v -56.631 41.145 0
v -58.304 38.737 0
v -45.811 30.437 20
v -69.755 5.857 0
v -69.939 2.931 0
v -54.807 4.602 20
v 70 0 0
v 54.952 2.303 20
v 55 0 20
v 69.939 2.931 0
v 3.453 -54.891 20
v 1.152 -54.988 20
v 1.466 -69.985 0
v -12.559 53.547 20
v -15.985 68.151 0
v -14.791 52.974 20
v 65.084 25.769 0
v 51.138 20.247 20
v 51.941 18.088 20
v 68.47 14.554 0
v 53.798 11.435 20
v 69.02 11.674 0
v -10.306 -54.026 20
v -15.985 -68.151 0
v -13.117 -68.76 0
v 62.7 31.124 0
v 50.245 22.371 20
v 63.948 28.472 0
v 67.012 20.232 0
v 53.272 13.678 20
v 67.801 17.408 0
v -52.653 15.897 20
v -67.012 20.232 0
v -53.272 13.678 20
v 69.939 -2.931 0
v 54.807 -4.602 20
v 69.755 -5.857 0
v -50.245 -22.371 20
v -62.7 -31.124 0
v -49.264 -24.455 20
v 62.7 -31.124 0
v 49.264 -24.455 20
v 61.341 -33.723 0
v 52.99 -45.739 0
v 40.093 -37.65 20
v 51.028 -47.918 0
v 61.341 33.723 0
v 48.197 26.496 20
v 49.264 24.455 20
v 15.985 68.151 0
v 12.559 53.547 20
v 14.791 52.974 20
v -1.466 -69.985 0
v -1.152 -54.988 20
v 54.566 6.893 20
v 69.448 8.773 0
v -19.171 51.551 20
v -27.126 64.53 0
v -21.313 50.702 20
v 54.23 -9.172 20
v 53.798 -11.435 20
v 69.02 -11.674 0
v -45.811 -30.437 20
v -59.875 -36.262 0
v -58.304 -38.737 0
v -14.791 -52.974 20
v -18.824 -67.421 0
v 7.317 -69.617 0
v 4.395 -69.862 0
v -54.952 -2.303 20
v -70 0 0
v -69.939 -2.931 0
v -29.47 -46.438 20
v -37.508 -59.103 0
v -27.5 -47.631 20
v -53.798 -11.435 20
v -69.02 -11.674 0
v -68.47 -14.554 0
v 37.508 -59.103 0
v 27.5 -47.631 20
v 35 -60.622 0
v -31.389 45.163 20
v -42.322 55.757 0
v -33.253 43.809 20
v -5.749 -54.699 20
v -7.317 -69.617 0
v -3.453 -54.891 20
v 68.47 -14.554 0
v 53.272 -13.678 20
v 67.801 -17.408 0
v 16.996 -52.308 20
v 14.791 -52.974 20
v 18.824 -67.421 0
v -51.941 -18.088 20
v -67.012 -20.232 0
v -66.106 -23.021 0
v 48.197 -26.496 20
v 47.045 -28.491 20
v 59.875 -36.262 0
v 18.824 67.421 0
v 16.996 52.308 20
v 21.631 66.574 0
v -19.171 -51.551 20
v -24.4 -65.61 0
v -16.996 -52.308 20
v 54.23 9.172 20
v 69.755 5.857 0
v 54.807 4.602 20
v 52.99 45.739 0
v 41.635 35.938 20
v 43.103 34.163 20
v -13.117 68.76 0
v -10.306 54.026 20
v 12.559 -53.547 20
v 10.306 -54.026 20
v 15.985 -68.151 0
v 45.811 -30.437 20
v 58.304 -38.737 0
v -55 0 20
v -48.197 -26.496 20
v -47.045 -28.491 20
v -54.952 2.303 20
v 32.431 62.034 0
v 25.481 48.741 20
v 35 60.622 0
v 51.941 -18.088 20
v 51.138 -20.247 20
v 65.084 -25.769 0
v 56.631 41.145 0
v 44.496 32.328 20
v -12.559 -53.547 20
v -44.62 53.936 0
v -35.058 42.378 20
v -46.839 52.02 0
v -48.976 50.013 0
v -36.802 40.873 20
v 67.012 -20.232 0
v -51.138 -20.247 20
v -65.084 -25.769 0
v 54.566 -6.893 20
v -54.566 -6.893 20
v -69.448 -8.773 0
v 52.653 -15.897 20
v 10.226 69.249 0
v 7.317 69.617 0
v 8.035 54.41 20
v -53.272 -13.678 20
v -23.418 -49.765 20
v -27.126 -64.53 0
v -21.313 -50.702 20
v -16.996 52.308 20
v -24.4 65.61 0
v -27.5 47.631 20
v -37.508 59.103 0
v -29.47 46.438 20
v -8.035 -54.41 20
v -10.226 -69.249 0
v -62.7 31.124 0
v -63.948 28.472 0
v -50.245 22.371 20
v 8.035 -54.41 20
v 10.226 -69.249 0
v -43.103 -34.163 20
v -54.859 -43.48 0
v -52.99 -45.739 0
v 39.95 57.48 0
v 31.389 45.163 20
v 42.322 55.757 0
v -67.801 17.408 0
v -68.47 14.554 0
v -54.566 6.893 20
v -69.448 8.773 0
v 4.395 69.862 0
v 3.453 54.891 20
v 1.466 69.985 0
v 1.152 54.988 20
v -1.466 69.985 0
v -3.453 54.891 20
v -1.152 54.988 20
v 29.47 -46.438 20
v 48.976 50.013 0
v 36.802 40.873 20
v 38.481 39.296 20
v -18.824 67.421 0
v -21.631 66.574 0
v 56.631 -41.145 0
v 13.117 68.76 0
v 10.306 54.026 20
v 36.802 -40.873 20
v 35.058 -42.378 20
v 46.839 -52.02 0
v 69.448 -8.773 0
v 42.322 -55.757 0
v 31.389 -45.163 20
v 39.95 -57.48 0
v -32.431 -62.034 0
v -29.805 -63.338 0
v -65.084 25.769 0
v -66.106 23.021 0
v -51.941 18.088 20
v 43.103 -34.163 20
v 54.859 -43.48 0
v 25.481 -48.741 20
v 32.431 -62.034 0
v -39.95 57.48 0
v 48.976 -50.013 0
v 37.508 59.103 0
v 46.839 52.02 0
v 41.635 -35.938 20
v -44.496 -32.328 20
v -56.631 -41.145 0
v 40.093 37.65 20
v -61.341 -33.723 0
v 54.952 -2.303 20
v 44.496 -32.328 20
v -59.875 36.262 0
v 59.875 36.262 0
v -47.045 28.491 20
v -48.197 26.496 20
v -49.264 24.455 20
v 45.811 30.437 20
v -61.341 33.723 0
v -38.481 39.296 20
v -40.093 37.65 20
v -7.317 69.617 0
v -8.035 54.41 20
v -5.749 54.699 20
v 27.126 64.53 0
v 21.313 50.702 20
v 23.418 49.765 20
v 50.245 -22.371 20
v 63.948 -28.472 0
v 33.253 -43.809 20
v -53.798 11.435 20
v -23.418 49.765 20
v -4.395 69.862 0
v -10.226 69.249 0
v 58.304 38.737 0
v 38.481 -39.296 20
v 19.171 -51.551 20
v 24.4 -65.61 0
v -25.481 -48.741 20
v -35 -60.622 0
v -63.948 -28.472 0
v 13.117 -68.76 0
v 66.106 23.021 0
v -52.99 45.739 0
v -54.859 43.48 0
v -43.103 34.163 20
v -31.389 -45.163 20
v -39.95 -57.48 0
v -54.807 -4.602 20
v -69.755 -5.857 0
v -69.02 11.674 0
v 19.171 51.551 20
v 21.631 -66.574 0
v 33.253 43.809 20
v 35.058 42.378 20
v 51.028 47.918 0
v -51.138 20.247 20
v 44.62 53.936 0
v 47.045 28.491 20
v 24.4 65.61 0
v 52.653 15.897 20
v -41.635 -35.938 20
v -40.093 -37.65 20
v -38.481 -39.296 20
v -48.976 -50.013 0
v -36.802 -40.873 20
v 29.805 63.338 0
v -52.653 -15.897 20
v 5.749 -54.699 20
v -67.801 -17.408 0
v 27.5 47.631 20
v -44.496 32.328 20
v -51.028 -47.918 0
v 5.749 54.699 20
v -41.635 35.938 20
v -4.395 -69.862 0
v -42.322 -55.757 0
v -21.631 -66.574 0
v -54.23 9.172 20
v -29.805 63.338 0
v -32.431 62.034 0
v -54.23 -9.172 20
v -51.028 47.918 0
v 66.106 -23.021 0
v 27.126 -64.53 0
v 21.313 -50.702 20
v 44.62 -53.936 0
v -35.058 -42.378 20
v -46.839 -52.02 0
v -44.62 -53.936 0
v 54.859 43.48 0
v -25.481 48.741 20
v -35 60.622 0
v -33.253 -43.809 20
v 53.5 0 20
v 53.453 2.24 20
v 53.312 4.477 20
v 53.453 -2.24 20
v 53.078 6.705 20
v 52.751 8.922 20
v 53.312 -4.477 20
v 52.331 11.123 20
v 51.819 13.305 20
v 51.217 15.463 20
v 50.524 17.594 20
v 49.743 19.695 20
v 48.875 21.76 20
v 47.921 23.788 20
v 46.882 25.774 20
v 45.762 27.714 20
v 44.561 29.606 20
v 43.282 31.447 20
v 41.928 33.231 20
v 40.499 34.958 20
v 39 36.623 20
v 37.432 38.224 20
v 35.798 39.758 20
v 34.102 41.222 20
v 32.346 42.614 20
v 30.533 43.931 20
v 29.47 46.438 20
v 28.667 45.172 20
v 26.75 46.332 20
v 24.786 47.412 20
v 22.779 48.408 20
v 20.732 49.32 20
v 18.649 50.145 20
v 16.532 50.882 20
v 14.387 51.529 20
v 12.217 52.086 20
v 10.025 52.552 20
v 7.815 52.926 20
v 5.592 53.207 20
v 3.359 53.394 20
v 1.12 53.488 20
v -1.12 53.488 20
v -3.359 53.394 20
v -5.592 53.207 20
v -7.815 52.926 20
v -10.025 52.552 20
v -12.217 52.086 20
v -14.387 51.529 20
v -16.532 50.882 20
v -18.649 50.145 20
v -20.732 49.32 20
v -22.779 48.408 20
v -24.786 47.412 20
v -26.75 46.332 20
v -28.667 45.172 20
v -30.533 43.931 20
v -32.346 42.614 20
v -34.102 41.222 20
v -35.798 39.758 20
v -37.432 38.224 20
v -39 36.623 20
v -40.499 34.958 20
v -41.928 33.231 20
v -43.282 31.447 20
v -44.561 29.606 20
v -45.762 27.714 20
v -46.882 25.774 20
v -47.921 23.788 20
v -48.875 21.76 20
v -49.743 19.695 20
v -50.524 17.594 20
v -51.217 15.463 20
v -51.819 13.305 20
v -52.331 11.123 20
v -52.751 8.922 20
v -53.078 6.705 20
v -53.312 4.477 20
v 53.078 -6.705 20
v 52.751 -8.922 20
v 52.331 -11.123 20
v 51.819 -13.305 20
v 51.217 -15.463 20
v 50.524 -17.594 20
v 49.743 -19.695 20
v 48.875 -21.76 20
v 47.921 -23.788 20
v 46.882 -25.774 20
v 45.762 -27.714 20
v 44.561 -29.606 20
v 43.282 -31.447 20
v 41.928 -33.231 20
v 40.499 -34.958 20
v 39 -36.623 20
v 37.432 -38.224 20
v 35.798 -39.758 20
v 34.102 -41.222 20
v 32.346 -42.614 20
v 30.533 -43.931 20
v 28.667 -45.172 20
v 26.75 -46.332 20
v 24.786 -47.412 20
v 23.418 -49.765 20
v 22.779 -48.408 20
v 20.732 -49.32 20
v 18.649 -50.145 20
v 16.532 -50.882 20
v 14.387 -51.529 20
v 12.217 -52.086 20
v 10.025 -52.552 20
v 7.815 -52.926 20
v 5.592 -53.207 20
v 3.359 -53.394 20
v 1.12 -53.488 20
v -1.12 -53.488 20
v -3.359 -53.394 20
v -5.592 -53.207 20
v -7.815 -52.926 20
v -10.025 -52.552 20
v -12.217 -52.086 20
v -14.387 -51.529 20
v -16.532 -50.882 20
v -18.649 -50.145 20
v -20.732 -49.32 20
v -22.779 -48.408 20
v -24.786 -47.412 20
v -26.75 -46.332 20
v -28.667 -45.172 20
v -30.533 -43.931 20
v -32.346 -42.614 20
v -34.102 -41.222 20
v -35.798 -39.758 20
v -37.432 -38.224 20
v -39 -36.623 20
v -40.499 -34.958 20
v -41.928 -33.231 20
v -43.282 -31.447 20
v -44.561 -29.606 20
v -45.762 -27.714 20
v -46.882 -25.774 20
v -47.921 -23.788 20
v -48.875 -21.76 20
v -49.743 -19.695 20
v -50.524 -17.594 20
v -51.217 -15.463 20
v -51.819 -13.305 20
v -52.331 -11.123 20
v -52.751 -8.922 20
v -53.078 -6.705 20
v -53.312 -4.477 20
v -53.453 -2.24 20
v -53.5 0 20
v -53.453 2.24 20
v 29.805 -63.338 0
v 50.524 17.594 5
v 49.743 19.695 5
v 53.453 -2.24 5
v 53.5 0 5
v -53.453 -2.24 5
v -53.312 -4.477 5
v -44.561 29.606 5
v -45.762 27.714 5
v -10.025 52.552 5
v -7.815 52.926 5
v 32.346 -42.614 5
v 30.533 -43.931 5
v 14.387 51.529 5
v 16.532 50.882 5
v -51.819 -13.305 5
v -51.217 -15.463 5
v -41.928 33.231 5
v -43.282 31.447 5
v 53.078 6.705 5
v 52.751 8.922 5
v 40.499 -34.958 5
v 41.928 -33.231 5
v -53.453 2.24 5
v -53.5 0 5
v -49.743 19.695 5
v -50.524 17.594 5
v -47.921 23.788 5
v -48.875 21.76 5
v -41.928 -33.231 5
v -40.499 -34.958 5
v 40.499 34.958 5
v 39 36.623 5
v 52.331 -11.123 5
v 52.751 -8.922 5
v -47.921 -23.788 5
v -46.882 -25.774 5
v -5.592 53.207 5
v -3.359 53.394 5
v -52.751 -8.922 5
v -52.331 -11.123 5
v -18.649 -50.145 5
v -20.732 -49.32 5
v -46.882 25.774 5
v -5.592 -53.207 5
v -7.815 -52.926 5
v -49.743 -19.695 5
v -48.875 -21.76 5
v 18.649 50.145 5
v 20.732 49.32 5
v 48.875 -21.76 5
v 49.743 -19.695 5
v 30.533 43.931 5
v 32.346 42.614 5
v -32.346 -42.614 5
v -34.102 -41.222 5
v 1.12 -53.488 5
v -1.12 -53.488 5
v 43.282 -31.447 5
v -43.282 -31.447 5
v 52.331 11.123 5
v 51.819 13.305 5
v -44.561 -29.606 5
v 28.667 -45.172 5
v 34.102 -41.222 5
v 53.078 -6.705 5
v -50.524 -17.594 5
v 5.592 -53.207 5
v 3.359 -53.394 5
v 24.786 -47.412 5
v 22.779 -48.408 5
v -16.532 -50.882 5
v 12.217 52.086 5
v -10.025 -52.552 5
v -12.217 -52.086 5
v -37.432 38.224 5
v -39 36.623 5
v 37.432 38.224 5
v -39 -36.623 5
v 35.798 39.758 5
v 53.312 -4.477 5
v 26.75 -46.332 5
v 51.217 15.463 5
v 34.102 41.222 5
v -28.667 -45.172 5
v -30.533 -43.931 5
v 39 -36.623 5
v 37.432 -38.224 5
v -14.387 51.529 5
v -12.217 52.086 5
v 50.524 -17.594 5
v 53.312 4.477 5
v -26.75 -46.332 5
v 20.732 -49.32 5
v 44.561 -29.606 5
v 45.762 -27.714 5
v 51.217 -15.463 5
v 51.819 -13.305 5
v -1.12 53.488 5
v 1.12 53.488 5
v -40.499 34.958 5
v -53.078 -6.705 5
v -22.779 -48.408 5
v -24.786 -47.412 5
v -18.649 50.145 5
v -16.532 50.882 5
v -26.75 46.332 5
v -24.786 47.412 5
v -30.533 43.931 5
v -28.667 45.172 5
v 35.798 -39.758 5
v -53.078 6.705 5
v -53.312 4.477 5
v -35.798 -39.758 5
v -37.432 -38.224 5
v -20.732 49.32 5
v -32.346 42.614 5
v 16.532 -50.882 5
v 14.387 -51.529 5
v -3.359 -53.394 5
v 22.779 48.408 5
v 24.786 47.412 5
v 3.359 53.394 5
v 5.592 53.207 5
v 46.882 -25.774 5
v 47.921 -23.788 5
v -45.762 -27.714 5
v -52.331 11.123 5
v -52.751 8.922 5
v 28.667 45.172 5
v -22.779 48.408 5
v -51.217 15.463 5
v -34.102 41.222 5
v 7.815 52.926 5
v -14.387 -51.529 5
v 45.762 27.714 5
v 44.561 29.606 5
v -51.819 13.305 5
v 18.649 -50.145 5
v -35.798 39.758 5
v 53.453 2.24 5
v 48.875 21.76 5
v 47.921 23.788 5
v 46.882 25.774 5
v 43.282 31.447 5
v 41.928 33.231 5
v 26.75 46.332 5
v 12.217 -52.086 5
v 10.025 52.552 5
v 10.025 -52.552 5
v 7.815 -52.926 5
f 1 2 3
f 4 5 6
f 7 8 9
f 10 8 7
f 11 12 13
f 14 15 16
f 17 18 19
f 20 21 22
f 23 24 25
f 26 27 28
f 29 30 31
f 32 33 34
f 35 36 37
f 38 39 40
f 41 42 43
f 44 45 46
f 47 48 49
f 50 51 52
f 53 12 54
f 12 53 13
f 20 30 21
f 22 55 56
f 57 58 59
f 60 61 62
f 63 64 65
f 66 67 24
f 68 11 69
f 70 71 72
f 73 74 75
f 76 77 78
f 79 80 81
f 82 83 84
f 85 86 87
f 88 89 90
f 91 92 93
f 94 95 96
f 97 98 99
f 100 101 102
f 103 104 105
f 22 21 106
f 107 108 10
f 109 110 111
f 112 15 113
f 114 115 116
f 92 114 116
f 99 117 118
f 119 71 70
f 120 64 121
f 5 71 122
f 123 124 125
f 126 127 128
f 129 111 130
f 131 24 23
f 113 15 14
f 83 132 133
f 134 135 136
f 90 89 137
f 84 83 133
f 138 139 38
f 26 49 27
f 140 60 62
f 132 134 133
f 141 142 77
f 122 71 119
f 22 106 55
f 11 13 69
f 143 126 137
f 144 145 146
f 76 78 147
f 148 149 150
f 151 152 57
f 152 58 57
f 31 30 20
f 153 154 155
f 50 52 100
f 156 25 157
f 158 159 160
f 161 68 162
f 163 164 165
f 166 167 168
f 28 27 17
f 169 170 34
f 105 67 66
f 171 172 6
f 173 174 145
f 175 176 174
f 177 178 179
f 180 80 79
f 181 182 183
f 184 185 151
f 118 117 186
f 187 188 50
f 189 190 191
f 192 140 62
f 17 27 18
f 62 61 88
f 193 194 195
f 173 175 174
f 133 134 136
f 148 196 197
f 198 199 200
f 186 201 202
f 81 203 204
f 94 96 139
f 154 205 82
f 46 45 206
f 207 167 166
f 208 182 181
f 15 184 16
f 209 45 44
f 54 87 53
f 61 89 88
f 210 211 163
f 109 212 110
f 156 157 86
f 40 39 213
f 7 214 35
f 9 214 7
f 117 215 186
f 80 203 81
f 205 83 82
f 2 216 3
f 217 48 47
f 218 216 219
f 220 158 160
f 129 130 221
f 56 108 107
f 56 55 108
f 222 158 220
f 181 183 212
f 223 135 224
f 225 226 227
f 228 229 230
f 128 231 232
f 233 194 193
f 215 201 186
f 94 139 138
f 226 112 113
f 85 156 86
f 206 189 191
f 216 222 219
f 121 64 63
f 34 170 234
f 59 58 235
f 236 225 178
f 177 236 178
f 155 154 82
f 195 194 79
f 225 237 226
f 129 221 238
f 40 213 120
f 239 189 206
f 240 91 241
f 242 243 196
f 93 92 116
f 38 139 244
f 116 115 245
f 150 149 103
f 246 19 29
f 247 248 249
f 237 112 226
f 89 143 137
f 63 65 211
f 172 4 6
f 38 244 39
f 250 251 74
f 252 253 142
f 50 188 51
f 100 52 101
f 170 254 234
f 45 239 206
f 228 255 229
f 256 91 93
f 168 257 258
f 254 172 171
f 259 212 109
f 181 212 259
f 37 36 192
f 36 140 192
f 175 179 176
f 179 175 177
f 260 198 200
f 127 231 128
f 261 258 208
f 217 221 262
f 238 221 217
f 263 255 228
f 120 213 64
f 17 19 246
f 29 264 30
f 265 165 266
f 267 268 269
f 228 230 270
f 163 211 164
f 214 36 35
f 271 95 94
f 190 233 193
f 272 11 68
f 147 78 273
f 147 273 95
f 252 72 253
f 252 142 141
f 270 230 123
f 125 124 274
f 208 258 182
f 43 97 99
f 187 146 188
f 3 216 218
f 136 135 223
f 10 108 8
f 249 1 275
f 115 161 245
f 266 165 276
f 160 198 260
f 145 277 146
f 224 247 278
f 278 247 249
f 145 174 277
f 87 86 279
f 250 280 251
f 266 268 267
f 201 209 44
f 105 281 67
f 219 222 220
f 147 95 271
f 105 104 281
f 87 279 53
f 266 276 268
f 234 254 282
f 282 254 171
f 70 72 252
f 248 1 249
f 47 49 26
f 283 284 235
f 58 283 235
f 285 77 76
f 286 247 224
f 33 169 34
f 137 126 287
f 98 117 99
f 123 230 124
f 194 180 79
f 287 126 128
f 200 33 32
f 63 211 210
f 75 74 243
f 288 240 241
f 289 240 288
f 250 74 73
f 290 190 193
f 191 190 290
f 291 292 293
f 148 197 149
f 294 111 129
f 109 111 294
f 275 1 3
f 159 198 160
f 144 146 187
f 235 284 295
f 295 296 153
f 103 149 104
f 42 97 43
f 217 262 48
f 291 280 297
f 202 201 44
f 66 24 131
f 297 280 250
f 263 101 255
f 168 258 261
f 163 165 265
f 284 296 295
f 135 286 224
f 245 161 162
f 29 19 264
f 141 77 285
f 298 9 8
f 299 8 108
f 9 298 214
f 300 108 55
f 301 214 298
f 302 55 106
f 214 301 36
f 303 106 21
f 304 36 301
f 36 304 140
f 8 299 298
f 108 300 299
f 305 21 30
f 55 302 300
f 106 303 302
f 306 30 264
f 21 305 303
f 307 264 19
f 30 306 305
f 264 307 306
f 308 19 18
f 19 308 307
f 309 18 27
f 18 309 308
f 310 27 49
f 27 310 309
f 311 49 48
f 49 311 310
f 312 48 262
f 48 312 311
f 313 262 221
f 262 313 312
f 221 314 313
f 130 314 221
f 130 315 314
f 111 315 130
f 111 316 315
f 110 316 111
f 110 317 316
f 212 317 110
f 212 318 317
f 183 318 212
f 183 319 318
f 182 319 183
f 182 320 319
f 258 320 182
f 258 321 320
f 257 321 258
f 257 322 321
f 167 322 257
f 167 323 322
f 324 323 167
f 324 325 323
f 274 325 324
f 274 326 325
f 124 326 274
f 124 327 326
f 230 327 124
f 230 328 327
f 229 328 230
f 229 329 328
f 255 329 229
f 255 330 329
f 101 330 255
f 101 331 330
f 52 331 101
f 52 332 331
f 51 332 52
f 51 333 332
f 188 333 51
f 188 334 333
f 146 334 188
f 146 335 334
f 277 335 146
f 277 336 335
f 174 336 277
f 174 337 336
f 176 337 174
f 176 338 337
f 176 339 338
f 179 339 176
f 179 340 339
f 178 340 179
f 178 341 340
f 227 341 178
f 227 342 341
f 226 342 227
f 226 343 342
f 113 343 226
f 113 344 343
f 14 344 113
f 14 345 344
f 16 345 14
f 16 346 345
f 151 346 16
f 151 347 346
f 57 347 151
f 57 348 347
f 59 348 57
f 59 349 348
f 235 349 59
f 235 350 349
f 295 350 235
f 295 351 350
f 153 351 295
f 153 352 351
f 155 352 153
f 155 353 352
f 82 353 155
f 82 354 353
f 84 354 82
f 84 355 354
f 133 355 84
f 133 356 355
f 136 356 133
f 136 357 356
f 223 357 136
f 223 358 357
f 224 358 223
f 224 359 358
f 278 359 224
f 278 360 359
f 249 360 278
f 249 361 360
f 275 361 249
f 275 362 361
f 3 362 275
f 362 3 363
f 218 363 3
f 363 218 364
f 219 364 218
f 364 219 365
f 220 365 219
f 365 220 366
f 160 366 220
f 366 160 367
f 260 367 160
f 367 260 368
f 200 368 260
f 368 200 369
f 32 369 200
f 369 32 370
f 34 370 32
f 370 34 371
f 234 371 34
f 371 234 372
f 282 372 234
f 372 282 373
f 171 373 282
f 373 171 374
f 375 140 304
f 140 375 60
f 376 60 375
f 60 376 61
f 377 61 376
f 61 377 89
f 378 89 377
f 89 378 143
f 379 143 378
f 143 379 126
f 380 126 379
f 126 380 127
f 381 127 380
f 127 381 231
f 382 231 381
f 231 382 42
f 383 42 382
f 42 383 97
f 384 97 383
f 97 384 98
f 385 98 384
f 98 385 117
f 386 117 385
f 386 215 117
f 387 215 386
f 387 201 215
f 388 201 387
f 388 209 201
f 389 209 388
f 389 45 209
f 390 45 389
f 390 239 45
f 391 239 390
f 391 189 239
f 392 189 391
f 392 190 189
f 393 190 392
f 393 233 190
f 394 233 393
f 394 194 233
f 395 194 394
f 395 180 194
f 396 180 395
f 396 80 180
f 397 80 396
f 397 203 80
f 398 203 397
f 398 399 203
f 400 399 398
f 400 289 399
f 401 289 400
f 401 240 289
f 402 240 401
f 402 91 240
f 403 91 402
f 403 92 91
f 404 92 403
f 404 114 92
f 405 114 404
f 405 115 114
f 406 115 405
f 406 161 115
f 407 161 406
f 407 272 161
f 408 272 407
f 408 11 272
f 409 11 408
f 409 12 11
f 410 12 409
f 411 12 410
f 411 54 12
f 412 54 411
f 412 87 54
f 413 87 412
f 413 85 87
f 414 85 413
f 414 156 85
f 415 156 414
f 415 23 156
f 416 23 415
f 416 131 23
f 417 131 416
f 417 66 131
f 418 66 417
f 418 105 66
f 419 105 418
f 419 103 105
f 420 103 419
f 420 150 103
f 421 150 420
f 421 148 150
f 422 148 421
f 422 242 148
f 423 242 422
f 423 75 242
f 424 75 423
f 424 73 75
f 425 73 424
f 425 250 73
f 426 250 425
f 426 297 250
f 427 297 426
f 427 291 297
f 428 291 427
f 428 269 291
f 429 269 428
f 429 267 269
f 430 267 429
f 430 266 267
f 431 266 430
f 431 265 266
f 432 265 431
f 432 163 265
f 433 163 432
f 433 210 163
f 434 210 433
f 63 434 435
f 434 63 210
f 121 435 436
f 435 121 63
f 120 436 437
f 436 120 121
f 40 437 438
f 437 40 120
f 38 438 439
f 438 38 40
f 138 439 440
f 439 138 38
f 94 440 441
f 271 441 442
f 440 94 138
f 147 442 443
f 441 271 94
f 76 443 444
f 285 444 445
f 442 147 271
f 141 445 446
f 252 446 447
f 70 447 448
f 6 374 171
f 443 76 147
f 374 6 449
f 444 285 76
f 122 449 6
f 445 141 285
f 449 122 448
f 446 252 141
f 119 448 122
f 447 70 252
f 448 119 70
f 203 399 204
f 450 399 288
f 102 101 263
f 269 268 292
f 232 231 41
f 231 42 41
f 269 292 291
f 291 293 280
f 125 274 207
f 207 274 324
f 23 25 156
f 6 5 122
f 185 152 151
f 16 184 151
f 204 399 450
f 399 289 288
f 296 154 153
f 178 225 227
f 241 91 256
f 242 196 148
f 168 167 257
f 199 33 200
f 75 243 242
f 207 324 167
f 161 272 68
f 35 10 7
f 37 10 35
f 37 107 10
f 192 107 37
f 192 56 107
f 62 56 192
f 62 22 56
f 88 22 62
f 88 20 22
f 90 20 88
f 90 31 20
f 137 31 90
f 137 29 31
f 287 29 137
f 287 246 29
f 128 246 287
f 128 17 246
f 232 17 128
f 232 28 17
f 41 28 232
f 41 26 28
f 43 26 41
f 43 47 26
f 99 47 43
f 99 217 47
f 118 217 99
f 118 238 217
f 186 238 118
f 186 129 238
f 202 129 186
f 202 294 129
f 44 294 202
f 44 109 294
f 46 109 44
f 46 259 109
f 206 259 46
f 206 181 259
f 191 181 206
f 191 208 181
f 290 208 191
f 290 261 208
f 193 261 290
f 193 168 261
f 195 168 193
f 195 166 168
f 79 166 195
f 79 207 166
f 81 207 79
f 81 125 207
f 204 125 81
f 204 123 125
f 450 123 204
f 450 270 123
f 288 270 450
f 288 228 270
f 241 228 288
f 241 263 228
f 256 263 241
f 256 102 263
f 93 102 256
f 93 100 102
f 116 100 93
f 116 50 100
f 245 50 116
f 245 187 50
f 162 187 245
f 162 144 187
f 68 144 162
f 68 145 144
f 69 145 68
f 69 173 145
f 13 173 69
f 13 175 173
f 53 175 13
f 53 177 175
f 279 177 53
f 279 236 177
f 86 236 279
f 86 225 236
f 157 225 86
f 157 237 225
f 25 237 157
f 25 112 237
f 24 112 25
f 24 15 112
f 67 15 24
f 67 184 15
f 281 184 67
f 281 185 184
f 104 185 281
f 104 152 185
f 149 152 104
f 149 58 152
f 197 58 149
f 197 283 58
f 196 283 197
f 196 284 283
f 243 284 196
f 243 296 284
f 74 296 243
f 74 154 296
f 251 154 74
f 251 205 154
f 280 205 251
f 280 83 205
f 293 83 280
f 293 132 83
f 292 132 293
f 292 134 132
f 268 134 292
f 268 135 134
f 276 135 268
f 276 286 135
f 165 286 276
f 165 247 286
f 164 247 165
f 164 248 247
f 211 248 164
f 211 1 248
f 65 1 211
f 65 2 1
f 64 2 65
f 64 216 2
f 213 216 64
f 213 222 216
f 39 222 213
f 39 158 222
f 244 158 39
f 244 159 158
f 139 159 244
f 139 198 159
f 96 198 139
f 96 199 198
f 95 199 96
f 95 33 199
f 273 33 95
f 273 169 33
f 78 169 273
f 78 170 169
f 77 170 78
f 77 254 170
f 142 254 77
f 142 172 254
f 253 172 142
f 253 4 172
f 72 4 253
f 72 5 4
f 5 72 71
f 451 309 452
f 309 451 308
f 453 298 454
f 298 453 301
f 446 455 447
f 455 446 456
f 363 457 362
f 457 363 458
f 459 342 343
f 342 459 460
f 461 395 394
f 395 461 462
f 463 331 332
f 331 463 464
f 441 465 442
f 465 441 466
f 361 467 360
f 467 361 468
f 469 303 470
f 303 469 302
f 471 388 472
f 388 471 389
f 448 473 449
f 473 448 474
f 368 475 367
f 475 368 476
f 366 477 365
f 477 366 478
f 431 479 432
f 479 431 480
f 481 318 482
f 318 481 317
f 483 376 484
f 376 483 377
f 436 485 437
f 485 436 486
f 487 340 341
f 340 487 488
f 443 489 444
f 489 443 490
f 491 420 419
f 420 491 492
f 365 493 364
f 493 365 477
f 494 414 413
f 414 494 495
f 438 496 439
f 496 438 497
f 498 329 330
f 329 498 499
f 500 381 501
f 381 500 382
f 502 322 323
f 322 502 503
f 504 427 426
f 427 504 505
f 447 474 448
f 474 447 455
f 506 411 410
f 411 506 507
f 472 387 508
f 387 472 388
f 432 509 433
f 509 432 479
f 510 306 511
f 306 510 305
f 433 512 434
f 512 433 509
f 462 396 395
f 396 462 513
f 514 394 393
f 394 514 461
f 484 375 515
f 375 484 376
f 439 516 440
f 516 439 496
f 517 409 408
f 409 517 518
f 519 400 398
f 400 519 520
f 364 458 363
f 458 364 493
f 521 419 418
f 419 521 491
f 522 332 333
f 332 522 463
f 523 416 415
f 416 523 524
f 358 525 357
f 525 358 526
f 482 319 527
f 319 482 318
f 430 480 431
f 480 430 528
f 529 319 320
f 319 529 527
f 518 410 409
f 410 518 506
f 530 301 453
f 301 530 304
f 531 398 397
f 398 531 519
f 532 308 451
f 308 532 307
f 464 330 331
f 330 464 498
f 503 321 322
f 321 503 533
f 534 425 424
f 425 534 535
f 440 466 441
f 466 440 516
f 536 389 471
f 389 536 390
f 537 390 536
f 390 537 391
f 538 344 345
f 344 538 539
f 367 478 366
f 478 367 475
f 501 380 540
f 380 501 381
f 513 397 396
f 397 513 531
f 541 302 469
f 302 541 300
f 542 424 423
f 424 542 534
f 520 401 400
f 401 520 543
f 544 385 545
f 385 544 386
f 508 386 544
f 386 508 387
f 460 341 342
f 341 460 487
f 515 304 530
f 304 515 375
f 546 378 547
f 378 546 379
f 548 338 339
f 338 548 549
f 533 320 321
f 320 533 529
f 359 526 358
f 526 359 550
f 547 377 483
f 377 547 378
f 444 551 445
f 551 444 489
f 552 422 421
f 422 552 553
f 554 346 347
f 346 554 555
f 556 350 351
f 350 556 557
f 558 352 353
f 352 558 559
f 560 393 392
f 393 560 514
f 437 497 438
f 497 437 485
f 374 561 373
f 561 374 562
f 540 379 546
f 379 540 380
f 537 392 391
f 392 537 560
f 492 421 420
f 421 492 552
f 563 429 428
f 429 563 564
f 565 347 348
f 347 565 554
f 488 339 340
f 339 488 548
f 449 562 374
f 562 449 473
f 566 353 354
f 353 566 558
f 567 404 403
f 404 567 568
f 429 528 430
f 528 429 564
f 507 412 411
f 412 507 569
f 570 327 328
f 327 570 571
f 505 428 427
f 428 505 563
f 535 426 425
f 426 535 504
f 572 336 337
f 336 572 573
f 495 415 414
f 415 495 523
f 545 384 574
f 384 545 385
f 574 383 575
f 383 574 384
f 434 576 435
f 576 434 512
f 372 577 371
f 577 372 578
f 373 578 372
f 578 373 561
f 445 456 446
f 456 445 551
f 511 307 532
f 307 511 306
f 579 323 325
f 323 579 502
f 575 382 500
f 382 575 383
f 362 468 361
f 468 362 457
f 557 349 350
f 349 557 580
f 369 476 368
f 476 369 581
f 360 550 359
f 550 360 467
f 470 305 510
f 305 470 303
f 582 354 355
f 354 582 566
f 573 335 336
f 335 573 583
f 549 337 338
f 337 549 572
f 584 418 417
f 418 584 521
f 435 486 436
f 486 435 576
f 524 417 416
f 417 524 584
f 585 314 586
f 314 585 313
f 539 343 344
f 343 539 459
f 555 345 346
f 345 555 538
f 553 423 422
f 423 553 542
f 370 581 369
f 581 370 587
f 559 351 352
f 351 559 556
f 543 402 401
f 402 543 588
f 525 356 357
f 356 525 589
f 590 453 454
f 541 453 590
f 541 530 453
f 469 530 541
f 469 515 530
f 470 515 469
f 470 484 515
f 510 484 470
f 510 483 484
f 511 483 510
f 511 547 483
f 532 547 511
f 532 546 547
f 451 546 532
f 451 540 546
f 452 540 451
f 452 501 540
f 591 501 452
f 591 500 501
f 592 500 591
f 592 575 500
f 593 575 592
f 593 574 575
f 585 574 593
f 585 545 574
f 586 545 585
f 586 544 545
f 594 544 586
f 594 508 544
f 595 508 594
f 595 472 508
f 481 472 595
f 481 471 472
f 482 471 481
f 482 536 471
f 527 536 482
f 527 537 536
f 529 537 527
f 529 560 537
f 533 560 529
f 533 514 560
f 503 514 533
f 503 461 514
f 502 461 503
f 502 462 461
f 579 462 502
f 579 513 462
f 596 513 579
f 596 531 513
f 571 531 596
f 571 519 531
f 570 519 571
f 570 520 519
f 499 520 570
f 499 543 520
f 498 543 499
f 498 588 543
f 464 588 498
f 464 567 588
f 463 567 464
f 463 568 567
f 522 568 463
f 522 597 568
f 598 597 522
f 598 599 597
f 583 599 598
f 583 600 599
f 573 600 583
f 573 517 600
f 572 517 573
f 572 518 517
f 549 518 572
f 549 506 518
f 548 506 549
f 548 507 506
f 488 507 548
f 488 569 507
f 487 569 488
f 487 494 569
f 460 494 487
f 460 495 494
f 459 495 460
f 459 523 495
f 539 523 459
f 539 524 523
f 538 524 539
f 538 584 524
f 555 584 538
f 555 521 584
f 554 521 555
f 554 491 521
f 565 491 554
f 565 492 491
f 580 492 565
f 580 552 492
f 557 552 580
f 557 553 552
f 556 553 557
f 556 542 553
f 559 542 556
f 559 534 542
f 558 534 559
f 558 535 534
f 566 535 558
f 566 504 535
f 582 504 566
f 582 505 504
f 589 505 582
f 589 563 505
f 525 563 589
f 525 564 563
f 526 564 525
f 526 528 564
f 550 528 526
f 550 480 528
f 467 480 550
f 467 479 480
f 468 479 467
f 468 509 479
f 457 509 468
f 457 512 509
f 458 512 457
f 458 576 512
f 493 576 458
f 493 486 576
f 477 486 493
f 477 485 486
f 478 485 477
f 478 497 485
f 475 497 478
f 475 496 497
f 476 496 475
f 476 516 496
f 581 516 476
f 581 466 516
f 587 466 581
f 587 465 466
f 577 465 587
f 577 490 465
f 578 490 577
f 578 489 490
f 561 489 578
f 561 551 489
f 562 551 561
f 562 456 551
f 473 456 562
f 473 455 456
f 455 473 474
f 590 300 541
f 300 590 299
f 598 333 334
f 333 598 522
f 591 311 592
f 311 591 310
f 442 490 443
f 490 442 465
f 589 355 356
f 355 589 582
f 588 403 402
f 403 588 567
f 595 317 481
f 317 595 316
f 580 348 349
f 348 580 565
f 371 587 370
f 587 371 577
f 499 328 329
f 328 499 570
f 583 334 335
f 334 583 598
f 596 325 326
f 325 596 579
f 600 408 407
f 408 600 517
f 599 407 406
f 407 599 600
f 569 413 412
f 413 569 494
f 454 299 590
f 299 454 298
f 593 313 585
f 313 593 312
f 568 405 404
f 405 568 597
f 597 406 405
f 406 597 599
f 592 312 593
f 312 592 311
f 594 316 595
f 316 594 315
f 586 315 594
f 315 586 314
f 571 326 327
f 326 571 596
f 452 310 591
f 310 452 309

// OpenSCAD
bowlWidth = 110;
bowlWallHeight = 20; // Total height of object
bowlWallWidth = 3;
bowlFloorThickness = 5; // Height of floor
bowlCurveExtend = 30;

$fn=150;

module bowl() {
    minkowski() {
        difference() {
            linear_extrude(bowlWallHeight)
                circle(d=bowlWidth, center=true);
        
            translate([0,0,bowlWallHeight - bowlFloorThickness])
            linear_extrude(bowlWallHeight + 5)
                circle(d=bowlWidth-bowlWallWidth, center=true);
        }
        translate([bowlWidth/2,0,0]) 
        rotate([90])
            linear_extrude(10)
                polygon(
                    [[0,0],[5,0],[0,5]],[[0,1,2]]
                );
            }
}

module bowl2() {
    difference() {
    cylinder(h=bowlWallHeight, d2=bowlWidth, d1=bowlWidth+bowlCurveExtend);
    
    translate([0,0,bowlWallHeight - (bowlWallHeight-bowlFloorThickness)])
        linear_extrude(bowlWallHeight + 5)
            circle(d=bowlWidth-bowlWallWidth);
    }
}
bowl2();
//bowl();
